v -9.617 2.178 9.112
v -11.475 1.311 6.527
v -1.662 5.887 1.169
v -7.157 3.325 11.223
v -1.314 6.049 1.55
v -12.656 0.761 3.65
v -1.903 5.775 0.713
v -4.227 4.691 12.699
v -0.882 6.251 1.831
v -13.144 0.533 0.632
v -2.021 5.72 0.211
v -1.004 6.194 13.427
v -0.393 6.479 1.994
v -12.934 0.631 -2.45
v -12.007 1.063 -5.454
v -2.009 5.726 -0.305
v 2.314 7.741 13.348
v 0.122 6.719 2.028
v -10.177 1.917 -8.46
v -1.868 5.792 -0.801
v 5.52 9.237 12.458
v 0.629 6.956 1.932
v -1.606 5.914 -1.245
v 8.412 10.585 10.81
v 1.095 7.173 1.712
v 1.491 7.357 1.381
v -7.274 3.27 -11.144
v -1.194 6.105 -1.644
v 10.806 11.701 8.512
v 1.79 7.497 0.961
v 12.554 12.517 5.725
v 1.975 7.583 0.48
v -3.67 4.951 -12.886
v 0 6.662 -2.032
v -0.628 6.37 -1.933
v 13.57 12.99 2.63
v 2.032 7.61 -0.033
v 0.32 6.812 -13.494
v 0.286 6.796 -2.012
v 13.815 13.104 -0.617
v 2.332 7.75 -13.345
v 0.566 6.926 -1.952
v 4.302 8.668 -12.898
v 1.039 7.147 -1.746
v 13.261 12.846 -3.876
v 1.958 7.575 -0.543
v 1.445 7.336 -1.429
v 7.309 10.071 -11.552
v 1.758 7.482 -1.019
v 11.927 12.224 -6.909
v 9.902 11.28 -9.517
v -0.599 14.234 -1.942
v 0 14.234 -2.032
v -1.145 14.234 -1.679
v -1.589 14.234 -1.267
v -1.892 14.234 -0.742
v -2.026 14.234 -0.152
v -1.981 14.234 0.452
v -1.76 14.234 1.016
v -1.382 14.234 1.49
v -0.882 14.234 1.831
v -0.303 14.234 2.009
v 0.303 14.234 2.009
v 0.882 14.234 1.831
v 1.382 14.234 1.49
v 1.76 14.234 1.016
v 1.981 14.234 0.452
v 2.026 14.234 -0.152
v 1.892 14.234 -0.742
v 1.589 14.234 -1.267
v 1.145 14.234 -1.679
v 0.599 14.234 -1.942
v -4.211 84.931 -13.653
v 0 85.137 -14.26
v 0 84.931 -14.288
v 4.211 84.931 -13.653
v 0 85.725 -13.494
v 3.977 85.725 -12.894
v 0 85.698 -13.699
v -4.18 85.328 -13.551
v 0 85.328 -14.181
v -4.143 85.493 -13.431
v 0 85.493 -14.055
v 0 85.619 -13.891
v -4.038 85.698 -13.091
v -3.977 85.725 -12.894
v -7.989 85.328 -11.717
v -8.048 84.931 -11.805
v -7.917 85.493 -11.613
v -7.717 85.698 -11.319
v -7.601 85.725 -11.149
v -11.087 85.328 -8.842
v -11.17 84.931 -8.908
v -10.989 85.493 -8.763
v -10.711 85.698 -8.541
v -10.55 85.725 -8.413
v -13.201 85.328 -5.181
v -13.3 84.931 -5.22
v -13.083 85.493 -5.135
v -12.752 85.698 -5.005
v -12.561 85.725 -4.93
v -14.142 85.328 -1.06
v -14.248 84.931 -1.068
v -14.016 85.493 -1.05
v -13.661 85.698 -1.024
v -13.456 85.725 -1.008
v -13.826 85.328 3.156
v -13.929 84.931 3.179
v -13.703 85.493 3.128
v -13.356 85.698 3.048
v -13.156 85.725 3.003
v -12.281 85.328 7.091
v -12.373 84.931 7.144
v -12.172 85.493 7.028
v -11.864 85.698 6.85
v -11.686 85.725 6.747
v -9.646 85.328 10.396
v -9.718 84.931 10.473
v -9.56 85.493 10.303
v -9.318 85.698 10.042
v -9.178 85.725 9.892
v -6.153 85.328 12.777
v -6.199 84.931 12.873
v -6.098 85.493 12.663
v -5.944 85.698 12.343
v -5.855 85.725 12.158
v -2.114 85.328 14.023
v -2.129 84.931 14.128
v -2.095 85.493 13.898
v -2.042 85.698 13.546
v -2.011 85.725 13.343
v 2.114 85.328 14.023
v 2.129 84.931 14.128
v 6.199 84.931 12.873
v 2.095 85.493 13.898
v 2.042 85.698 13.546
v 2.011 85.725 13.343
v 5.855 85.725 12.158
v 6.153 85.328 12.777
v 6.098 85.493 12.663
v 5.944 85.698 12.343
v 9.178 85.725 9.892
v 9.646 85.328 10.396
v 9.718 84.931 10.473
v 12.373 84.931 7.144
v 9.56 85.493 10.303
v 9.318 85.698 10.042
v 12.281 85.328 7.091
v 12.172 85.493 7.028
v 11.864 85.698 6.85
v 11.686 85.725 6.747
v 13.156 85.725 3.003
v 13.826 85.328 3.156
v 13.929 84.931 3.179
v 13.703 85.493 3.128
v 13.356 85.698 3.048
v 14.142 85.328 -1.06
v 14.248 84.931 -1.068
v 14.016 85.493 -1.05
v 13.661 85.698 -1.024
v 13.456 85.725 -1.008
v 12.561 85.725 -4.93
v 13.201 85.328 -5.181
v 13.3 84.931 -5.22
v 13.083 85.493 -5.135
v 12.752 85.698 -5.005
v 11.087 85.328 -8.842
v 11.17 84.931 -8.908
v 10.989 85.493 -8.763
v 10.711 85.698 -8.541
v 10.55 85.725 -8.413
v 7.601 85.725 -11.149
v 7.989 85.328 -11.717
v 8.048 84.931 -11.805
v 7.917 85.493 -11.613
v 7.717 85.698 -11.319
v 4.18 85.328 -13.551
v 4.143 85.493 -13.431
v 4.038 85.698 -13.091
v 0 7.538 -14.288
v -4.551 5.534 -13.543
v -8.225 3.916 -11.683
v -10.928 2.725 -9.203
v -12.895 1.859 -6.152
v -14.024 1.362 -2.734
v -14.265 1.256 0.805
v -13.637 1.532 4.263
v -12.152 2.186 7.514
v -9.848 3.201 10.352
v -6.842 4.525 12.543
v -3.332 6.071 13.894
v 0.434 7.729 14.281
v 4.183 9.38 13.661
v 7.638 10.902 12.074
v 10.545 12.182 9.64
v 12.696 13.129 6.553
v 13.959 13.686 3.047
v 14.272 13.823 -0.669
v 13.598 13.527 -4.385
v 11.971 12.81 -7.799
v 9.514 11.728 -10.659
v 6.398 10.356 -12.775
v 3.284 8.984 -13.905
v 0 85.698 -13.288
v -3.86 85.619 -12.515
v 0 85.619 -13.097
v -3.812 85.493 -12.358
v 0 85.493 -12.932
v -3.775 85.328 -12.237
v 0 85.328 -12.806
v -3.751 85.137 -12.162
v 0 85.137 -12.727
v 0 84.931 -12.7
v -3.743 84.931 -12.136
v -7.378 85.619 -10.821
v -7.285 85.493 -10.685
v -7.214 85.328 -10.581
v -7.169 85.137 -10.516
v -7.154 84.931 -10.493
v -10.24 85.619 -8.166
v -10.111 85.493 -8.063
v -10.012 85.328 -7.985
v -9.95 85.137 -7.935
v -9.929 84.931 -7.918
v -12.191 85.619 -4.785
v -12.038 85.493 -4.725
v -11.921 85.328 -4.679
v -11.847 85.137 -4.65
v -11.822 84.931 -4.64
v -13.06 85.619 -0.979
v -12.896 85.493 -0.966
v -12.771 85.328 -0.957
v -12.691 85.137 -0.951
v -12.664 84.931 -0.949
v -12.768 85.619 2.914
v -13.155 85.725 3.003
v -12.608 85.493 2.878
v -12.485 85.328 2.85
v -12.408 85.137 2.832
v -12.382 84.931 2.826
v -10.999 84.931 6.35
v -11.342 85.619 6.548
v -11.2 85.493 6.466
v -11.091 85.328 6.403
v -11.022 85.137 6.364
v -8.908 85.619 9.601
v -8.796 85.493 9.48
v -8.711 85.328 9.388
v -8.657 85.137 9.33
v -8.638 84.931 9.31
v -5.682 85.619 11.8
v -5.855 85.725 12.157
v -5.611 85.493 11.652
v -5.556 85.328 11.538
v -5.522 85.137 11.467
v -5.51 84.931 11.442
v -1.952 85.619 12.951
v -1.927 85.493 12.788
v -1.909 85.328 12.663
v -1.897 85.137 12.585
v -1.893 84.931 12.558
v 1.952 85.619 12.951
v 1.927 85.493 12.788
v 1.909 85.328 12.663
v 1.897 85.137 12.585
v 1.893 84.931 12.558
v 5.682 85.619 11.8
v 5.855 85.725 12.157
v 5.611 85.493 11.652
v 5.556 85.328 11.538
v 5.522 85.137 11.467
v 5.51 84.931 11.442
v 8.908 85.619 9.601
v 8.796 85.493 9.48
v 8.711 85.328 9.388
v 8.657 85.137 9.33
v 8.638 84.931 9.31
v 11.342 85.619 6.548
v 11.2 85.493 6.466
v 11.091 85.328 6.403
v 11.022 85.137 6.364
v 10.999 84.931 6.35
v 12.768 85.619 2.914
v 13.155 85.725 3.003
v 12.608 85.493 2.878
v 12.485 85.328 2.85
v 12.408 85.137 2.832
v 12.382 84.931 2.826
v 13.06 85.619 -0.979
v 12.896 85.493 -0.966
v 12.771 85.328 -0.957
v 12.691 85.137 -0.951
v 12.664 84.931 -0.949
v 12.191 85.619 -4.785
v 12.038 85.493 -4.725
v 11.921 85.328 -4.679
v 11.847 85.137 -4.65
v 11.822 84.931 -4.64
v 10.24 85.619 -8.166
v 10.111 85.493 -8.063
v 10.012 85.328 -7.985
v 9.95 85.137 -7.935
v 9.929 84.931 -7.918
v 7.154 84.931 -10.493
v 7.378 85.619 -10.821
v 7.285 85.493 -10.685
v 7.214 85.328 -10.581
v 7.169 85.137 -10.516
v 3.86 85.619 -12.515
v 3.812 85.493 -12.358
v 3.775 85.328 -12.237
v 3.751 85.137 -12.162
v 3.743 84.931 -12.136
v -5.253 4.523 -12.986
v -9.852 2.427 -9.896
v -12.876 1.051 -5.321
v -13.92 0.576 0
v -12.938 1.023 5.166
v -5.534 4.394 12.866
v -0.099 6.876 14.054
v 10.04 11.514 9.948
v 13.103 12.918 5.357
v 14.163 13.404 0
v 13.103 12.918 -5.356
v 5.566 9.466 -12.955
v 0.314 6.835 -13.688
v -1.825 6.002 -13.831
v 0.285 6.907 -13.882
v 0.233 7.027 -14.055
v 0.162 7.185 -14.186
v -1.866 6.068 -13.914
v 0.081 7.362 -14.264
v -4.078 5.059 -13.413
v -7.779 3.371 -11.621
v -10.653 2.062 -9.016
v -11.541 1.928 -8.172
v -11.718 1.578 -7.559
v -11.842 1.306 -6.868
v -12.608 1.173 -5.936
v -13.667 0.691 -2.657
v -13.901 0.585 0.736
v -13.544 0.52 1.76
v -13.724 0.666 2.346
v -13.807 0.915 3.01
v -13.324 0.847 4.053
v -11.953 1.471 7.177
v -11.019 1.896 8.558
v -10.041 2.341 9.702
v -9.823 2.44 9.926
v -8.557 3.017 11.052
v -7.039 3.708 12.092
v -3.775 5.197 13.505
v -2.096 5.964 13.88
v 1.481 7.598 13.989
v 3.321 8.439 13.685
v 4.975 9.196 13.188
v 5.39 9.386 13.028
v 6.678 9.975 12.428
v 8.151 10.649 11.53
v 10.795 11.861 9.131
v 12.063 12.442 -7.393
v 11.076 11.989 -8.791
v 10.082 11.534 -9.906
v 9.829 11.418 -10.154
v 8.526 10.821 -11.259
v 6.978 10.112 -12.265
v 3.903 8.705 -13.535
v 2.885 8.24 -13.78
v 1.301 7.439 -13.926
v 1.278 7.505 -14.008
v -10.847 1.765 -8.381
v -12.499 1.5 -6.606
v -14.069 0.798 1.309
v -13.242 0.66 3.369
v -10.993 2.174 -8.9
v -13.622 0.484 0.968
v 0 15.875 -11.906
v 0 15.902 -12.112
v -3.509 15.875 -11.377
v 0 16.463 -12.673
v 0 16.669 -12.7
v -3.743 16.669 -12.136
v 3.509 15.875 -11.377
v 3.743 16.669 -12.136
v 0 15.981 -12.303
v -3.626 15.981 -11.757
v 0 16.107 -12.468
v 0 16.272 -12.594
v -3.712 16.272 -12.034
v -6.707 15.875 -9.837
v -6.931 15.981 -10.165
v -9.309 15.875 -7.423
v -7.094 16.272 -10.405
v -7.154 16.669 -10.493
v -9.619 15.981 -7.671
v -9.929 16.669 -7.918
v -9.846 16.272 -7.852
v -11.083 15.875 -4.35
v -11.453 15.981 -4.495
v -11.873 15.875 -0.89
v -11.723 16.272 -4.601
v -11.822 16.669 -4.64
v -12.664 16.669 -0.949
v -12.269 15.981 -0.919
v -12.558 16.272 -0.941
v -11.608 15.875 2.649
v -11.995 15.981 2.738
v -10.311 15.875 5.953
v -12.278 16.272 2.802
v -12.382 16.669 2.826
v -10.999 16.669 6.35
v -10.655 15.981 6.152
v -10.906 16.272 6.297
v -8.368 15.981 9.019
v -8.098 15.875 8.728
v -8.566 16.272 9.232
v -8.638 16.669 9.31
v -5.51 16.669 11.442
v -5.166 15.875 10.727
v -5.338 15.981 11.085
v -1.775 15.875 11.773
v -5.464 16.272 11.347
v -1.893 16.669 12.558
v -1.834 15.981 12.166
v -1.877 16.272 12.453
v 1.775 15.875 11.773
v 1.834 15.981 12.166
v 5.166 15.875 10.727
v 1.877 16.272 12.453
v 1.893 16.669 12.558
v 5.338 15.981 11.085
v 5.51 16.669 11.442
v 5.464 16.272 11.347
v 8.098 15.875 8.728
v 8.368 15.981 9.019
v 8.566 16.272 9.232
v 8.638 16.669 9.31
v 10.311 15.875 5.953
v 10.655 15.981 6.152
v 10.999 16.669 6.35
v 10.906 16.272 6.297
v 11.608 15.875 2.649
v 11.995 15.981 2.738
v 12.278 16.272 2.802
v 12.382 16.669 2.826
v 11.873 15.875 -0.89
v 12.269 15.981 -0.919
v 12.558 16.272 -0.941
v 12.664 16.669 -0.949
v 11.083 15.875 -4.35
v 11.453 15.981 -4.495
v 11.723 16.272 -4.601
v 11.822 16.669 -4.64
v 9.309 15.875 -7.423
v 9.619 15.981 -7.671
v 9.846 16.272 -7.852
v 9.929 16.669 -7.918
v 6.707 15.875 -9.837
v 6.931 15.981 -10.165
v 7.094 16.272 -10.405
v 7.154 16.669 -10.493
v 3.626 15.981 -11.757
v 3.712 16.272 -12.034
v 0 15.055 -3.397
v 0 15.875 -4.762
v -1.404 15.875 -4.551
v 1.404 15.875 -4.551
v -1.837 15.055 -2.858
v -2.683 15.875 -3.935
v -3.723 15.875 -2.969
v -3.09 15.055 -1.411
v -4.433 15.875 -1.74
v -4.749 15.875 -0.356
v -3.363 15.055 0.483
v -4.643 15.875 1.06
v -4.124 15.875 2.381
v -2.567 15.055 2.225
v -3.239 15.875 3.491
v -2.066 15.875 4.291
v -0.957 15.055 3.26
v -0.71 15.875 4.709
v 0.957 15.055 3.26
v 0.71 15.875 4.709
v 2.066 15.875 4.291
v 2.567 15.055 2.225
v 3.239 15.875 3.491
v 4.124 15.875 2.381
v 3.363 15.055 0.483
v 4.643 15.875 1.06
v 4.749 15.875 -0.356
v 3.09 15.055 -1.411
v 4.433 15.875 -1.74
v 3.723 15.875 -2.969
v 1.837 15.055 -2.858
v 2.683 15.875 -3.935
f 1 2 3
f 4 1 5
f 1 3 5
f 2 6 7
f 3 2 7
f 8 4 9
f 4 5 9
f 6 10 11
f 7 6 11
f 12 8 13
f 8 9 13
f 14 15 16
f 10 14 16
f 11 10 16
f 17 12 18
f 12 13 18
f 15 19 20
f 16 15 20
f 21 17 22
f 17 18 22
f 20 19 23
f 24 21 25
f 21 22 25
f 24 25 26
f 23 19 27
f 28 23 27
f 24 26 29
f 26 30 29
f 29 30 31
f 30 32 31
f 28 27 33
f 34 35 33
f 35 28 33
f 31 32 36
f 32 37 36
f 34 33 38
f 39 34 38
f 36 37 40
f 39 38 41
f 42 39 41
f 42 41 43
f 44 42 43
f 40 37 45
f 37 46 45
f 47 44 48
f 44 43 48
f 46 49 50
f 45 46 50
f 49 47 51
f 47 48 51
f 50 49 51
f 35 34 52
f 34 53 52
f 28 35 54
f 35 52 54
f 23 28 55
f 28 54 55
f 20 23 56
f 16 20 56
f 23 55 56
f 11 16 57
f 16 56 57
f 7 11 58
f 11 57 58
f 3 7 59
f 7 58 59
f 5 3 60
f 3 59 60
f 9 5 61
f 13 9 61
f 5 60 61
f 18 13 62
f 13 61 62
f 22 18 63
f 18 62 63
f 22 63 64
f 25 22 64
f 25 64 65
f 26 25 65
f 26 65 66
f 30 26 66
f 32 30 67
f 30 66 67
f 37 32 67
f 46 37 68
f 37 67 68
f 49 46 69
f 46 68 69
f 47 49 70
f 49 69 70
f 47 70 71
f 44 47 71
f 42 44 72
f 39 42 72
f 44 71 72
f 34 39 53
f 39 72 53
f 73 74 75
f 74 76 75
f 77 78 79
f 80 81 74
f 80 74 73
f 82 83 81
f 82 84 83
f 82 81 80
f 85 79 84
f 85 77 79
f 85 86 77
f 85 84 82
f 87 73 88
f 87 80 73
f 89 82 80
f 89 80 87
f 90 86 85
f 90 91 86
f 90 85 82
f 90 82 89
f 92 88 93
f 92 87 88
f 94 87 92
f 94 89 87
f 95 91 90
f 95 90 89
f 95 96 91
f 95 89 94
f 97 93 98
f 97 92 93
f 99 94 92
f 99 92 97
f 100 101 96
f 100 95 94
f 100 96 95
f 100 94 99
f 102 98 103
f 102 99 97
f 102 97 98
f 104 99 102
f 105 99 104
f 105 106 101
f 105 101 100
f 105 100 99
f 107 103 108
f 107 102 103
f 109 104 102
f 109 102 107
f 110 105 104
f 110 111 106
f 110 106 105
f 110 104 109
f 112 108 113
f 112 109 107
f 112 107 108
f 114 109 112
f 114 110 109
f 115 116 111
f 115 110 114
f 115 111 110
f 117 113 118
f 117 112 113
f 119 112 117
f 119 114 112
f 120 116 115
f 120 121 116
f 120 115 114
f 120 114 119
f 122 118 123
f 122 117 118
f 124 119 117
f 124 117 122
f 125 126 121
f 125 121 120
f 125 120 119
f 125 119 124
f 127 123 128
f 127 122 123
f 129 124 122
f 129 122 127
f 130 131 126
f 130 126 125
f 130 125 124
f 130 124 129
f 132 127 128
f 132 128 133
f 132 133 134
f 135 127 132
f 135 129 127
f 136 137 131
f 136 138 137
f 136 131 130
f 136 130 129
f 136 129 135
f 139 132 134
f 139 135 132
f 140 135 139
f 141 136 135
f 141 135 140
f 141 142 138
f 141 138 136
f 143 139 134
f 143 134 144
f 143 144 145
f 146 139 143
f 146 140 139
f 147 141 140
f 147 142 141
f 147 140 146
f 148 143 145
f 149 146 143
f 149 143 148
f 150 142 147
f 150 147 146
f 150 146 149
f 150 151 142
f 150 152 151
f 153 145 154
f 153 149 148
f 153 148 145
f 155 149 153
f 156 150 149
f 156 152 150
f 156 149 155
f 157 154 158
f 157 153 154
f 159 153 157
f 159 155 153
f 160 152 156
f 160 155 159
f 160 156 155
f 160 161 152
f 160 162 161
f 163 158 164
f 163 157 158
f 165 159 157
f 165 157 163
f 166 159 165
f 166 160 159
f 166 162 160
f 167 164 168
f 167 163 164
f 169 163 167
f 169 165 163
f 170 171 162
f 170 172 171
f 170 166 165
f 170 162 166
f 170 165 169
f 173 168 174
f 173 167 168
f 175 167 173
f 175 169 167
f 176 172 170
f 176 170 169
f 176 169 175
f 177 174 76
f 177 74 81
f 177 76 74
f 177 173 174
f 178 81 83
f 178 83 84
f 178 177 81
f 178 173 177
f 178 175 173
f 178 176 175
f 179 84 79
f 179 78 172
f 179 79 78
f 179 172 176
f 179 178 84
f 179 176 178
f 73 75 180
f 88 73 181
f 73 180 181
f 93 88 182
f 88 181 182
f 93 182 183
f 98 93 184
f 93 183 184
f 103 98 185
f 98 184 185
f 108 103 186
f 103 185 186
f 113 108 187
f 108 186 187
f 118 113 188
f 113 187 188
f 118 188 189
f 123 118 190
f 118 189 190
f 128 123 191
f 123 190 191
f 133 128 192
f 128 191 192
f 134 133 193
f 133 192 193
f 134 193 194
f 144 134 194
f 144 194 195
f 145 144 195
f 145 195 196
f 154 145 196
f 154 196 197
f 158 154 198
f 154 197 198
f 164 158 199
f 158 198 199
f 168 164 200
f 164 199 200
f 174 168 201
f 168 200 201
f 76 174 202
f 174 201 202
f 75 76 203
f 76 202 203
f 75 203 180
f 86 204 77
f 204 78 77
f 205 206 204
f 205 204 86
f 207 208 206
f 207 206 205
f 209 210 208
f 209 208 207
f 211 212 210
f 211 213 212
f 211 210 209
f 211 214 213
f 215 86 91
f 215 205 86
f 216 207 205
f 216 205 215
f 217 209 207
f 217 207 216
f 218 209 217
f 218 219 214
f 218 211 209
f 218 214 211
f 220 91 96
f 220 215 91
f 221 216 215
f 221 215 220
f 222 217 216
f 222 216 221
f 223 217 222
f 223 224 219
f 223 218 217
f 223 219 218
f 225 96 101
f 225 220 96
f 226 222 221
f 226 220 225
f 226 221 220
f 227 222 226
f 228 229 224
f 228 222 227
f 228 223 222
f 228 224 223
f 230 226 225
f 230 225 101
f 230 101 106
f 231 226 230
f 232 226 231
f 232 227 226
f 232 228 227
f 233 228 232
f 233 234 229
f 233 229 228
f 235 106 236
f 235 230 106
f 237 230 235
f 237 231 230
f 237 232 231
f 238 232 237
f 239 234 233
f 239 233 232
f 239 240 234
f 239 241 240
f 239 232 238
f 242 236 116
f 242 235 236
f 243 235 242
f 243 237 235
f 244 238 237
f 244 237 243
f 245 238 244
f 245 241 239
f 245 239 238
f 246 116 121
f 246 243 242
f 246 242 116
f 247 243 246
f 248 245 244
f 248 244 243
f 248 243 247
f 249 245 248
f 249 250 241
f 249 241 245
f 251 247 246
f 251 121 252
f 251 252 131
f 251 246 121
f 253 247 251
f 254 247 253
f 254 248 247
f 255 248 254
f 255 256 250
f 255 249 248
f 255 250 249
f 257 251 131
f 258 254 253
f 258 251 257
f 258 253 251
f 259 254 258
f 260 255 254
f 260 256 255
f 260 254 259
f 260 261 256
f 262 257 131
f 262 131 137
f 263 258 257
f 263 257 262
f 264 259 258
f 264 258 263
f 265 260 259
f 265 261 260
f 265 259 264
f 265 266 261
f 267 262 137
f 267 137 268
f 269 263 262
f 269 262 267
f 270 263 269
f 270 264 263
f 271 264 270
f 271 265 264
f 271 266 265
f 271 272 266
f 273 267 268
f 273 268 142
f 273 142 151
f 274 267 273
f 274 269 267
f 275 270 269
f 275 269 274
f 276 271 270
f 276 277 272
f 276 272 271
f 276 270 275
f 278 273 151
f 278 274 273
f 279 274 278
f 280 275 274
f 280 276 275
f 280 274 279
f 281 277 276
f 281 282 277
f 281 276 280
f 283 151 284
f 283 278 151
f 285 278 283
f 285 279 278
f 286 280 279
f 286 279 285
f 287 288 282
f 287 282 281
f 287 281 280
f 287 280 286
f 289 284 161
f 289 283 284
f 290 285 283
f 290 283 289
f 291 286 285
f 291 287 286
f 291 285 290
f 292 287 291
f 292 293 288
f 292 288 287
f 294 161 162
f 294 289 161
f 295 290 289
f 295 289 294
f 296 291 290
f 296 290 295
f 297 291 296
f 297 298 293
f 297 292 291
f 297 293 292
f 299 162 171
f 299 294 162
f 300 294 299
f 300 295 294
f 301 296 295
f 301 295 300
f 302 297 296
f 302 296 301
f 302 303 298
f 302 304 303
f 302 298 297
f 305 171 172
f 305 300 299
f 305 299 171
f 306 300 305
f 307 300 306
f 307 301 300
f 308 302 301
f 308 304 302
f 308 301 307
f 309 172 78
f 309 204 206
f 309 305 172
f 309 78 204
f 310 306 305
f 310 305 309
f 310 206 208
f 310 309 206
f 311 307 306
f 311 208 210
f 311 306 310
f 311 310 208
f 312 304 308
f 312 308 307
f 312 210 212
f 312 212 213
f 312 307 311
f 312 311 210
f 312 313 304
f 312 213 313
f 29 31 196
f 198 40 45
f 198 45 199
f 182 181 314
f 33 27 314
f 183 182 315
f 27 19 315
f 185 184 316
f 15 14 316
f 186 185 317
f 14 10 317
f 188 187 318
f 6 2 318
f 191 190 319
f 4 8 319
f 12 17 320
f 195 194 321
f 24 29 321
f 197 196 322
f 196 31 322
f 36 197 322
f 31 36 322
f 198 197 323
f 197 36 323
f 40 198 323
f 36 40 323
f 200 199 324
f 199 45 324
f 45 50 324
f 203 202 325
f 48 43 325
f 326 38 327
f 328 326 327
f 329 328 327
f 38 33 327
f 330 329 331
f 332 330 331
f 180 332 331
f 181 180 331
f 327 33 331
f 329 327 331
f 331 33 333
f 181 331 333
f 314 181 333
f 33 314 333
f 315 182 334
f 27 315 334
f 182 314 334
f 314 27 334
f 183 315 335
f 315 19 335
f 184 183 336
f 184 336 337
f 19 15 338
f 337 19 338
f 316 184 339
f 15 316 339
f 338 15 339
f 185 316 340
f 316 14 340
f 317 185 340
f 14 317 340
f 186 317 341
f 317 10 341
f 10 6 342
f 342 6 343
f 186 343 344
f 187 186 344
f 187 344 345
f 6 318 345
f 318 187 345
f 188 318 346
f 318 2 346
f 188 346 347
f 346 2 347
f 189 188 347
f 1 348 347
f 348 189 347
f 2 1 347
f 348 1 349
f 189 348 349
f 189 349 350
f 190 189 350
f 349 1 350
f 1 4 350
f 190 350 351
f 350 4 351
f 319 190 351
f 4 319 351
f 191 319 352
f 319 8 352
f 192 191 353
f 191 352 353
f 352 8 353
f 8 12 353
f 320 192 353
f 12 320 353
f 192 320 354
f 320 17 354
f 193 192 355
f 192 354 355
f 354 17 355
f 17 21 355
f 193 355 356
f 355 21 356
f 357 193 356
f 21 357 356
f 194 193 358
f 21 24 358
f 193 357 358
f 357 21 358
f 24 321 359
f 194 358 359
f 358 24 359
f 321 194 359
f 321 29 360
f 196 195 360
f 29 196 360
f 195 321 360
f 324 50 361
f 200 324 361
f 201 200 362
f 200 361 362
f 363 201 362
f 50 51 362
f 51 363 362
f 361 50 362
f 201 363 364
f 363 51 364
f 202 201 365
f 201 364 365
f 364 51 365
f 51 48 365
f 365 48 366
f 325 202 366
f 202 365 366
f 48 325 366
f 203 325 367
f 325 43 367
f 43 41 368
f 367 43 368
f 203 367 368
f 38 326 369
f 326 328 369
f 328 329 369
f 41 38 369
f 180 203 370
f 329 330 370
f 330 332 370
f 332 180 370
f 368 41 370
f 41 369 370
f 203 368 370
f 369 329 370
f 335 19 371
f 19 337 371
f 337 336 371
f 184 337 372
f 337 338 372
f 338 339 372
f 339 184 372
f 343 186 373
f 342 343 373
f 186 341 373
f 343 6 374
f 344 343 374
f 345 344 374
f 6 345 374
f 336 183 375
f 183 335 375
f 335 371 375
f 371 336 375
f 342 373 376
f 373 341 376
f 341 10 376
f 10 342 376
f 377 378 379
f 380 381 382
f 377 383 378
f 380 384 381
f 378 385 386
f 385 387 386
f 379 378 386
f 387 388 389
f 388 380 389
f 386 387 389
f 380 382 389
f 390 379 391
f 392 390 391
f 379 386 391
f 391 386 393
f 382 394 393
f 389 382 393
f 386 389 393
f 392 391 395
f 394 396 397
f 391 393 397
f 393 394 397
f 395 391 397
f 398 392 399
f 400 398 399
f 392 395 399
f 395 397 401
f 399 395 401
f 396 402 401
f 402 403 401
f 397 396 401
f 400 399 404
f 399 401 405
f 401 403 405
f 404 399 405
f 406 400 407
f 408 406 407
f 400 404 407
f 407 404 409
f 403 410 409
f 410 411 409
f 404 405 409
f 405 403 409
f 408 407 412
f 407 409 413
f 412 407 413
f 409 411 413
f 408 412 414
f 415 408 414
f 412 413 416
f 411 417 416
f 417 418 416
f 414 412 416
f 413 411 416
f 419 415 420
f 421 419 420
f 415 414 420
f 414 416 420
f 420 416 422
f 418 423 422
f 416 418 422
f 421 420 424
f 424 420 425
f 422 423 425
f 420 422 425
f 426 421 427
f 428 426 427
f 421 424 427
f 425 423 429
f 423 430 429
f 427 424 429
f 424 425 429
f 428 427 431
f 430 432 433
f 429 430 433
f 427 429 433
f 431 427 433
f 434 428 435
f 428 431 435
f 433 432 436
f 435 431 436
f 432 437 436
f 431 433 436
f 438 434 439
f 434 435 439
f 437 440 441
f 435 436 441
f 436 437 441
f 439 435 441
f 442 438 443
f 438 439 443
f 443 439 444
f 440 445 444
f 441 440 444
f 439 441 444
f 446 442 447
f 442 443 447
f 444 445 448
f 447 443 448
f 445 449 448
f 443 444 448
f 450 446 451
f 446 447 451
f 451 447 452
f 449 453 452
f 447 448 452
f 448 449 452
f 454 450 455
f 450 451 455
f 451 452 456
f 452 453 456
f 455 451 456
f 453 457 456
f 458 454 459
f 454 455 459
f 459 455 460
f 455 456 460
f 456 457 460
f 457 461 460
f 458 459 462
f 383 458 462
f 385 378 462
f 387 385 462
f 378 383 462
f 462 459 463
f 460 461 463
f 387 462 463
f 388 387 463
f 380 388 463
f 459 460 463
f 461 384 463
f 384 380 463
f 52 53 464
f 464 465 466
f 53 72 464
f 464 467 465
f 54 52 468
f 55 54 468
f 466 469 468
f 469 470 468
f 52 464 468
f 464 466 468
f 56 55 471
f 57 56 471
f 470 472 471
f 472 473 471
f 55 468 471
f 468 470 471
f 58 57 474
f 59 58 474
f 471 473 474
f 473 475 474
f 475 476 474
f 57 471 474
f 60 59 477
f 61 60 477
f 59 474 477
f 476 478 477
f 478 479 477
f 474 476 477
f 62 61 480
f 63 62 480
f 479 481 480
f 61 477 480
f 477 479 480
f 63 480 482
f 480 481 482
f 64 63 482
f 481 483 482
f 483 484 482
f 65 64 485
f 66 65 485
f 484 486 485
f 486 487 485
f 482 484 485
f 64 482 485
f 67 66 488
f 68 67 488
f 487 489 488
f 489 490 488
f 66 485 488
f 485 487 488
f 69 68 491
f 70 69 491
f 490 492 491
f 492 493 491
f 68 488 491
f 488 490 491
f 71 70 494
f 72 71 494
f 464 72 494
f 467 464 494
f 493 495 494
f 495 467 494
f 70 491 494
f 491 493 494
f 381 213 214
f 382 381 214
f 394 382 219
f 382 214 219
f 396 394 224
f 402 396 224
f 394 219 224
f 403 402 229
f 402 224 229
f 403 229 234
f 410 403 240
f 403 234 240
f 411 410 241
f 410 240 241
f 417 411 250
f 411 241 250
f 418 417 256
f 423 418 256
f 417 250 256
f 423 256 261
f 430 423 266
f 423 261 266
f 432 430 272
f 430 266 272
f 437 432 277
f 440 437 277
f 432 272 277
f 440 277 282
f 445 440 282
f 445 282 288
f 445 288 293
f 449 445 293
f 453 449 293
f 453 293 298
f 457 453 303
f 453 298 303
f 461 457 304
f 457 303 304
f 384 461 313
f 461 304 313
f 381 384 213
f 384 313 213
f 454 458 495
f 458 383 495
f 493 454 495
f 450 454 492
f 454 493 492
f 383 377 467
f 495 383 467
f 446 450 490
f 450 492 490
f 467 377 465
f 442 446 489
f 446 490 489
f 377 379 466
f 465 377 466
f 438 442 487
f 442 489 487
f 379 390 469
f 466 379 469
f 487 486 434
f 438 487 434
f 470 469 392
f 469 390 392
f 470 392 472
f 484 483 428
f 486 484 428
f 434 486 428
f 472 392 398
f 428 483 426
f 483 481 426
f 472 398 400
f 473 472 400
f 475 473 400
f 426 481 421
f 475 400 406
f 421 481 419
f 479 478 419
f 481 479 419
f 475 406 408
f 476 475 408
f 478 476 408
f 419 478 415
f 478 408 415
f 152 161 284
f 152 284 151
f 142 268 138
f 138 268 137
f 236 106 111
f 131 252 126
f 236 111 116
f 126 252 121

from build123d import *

# Parameters (mm, degrees)
CUT_EXTRUDE1_DEPTH      = 89.074065067
CUT_EXTRUDE1_DEPTH_BACK = 89.074065067
FILLET1_R               = 0.79375


with BuildPart() as part:
    # Sketch1 → Revolve1 (revolve)
    with BuildSketch(Plane.XY, mode=Mode.PRIVATE) as revolve1_sk:
        Polygon((-2.032, 0), (-2.032, 14.23435008), (-4.7625, 15.875), (-12.7, 15.875), (-12.7, 85.725), (-14.2875, 85.725), (-14.2875, 0), align=None)
    revolve(revolve1_sk.sketch.rotate(Axis((0, 0, 0), (0, 1, 0)), 270), axis=Axis((0, 0, 0), (0, 1, 0)))

    # Sketch2 → Cut-Extrude1 (cut, two sides: drawn at the far end of the back side and taken through both)
    with BuildSketch(Plane.XY.offset(-CUT_EXTRUDE1_DEPTH_BACK)):
        Polygon((-14.2875, 0), (14.2875, 13.324741332), (14.2875, 0), align=None)
    extrude(amount=CUT_EXTRUDE1_DEPTH + CUT_EXTRUDE1_DEPTH_BACK, mode=Mode.SUBTRACT)

    # Fillet1
    fillet1_edges = [part.edges().sort_by_distance(p)[0] for p in [
        (-10.102788136, 1.951363189, -10.102788136),
        (0, 85.725, 14.2875),
        (0, 85.725, 12.7),
        (0, 15.875, 12.7),
    ]]
    fillet(fillet1_edges, radius=FILLET1_R - 0.0001)  # a hair under: the kernel refuses the full size


solid = part.part
